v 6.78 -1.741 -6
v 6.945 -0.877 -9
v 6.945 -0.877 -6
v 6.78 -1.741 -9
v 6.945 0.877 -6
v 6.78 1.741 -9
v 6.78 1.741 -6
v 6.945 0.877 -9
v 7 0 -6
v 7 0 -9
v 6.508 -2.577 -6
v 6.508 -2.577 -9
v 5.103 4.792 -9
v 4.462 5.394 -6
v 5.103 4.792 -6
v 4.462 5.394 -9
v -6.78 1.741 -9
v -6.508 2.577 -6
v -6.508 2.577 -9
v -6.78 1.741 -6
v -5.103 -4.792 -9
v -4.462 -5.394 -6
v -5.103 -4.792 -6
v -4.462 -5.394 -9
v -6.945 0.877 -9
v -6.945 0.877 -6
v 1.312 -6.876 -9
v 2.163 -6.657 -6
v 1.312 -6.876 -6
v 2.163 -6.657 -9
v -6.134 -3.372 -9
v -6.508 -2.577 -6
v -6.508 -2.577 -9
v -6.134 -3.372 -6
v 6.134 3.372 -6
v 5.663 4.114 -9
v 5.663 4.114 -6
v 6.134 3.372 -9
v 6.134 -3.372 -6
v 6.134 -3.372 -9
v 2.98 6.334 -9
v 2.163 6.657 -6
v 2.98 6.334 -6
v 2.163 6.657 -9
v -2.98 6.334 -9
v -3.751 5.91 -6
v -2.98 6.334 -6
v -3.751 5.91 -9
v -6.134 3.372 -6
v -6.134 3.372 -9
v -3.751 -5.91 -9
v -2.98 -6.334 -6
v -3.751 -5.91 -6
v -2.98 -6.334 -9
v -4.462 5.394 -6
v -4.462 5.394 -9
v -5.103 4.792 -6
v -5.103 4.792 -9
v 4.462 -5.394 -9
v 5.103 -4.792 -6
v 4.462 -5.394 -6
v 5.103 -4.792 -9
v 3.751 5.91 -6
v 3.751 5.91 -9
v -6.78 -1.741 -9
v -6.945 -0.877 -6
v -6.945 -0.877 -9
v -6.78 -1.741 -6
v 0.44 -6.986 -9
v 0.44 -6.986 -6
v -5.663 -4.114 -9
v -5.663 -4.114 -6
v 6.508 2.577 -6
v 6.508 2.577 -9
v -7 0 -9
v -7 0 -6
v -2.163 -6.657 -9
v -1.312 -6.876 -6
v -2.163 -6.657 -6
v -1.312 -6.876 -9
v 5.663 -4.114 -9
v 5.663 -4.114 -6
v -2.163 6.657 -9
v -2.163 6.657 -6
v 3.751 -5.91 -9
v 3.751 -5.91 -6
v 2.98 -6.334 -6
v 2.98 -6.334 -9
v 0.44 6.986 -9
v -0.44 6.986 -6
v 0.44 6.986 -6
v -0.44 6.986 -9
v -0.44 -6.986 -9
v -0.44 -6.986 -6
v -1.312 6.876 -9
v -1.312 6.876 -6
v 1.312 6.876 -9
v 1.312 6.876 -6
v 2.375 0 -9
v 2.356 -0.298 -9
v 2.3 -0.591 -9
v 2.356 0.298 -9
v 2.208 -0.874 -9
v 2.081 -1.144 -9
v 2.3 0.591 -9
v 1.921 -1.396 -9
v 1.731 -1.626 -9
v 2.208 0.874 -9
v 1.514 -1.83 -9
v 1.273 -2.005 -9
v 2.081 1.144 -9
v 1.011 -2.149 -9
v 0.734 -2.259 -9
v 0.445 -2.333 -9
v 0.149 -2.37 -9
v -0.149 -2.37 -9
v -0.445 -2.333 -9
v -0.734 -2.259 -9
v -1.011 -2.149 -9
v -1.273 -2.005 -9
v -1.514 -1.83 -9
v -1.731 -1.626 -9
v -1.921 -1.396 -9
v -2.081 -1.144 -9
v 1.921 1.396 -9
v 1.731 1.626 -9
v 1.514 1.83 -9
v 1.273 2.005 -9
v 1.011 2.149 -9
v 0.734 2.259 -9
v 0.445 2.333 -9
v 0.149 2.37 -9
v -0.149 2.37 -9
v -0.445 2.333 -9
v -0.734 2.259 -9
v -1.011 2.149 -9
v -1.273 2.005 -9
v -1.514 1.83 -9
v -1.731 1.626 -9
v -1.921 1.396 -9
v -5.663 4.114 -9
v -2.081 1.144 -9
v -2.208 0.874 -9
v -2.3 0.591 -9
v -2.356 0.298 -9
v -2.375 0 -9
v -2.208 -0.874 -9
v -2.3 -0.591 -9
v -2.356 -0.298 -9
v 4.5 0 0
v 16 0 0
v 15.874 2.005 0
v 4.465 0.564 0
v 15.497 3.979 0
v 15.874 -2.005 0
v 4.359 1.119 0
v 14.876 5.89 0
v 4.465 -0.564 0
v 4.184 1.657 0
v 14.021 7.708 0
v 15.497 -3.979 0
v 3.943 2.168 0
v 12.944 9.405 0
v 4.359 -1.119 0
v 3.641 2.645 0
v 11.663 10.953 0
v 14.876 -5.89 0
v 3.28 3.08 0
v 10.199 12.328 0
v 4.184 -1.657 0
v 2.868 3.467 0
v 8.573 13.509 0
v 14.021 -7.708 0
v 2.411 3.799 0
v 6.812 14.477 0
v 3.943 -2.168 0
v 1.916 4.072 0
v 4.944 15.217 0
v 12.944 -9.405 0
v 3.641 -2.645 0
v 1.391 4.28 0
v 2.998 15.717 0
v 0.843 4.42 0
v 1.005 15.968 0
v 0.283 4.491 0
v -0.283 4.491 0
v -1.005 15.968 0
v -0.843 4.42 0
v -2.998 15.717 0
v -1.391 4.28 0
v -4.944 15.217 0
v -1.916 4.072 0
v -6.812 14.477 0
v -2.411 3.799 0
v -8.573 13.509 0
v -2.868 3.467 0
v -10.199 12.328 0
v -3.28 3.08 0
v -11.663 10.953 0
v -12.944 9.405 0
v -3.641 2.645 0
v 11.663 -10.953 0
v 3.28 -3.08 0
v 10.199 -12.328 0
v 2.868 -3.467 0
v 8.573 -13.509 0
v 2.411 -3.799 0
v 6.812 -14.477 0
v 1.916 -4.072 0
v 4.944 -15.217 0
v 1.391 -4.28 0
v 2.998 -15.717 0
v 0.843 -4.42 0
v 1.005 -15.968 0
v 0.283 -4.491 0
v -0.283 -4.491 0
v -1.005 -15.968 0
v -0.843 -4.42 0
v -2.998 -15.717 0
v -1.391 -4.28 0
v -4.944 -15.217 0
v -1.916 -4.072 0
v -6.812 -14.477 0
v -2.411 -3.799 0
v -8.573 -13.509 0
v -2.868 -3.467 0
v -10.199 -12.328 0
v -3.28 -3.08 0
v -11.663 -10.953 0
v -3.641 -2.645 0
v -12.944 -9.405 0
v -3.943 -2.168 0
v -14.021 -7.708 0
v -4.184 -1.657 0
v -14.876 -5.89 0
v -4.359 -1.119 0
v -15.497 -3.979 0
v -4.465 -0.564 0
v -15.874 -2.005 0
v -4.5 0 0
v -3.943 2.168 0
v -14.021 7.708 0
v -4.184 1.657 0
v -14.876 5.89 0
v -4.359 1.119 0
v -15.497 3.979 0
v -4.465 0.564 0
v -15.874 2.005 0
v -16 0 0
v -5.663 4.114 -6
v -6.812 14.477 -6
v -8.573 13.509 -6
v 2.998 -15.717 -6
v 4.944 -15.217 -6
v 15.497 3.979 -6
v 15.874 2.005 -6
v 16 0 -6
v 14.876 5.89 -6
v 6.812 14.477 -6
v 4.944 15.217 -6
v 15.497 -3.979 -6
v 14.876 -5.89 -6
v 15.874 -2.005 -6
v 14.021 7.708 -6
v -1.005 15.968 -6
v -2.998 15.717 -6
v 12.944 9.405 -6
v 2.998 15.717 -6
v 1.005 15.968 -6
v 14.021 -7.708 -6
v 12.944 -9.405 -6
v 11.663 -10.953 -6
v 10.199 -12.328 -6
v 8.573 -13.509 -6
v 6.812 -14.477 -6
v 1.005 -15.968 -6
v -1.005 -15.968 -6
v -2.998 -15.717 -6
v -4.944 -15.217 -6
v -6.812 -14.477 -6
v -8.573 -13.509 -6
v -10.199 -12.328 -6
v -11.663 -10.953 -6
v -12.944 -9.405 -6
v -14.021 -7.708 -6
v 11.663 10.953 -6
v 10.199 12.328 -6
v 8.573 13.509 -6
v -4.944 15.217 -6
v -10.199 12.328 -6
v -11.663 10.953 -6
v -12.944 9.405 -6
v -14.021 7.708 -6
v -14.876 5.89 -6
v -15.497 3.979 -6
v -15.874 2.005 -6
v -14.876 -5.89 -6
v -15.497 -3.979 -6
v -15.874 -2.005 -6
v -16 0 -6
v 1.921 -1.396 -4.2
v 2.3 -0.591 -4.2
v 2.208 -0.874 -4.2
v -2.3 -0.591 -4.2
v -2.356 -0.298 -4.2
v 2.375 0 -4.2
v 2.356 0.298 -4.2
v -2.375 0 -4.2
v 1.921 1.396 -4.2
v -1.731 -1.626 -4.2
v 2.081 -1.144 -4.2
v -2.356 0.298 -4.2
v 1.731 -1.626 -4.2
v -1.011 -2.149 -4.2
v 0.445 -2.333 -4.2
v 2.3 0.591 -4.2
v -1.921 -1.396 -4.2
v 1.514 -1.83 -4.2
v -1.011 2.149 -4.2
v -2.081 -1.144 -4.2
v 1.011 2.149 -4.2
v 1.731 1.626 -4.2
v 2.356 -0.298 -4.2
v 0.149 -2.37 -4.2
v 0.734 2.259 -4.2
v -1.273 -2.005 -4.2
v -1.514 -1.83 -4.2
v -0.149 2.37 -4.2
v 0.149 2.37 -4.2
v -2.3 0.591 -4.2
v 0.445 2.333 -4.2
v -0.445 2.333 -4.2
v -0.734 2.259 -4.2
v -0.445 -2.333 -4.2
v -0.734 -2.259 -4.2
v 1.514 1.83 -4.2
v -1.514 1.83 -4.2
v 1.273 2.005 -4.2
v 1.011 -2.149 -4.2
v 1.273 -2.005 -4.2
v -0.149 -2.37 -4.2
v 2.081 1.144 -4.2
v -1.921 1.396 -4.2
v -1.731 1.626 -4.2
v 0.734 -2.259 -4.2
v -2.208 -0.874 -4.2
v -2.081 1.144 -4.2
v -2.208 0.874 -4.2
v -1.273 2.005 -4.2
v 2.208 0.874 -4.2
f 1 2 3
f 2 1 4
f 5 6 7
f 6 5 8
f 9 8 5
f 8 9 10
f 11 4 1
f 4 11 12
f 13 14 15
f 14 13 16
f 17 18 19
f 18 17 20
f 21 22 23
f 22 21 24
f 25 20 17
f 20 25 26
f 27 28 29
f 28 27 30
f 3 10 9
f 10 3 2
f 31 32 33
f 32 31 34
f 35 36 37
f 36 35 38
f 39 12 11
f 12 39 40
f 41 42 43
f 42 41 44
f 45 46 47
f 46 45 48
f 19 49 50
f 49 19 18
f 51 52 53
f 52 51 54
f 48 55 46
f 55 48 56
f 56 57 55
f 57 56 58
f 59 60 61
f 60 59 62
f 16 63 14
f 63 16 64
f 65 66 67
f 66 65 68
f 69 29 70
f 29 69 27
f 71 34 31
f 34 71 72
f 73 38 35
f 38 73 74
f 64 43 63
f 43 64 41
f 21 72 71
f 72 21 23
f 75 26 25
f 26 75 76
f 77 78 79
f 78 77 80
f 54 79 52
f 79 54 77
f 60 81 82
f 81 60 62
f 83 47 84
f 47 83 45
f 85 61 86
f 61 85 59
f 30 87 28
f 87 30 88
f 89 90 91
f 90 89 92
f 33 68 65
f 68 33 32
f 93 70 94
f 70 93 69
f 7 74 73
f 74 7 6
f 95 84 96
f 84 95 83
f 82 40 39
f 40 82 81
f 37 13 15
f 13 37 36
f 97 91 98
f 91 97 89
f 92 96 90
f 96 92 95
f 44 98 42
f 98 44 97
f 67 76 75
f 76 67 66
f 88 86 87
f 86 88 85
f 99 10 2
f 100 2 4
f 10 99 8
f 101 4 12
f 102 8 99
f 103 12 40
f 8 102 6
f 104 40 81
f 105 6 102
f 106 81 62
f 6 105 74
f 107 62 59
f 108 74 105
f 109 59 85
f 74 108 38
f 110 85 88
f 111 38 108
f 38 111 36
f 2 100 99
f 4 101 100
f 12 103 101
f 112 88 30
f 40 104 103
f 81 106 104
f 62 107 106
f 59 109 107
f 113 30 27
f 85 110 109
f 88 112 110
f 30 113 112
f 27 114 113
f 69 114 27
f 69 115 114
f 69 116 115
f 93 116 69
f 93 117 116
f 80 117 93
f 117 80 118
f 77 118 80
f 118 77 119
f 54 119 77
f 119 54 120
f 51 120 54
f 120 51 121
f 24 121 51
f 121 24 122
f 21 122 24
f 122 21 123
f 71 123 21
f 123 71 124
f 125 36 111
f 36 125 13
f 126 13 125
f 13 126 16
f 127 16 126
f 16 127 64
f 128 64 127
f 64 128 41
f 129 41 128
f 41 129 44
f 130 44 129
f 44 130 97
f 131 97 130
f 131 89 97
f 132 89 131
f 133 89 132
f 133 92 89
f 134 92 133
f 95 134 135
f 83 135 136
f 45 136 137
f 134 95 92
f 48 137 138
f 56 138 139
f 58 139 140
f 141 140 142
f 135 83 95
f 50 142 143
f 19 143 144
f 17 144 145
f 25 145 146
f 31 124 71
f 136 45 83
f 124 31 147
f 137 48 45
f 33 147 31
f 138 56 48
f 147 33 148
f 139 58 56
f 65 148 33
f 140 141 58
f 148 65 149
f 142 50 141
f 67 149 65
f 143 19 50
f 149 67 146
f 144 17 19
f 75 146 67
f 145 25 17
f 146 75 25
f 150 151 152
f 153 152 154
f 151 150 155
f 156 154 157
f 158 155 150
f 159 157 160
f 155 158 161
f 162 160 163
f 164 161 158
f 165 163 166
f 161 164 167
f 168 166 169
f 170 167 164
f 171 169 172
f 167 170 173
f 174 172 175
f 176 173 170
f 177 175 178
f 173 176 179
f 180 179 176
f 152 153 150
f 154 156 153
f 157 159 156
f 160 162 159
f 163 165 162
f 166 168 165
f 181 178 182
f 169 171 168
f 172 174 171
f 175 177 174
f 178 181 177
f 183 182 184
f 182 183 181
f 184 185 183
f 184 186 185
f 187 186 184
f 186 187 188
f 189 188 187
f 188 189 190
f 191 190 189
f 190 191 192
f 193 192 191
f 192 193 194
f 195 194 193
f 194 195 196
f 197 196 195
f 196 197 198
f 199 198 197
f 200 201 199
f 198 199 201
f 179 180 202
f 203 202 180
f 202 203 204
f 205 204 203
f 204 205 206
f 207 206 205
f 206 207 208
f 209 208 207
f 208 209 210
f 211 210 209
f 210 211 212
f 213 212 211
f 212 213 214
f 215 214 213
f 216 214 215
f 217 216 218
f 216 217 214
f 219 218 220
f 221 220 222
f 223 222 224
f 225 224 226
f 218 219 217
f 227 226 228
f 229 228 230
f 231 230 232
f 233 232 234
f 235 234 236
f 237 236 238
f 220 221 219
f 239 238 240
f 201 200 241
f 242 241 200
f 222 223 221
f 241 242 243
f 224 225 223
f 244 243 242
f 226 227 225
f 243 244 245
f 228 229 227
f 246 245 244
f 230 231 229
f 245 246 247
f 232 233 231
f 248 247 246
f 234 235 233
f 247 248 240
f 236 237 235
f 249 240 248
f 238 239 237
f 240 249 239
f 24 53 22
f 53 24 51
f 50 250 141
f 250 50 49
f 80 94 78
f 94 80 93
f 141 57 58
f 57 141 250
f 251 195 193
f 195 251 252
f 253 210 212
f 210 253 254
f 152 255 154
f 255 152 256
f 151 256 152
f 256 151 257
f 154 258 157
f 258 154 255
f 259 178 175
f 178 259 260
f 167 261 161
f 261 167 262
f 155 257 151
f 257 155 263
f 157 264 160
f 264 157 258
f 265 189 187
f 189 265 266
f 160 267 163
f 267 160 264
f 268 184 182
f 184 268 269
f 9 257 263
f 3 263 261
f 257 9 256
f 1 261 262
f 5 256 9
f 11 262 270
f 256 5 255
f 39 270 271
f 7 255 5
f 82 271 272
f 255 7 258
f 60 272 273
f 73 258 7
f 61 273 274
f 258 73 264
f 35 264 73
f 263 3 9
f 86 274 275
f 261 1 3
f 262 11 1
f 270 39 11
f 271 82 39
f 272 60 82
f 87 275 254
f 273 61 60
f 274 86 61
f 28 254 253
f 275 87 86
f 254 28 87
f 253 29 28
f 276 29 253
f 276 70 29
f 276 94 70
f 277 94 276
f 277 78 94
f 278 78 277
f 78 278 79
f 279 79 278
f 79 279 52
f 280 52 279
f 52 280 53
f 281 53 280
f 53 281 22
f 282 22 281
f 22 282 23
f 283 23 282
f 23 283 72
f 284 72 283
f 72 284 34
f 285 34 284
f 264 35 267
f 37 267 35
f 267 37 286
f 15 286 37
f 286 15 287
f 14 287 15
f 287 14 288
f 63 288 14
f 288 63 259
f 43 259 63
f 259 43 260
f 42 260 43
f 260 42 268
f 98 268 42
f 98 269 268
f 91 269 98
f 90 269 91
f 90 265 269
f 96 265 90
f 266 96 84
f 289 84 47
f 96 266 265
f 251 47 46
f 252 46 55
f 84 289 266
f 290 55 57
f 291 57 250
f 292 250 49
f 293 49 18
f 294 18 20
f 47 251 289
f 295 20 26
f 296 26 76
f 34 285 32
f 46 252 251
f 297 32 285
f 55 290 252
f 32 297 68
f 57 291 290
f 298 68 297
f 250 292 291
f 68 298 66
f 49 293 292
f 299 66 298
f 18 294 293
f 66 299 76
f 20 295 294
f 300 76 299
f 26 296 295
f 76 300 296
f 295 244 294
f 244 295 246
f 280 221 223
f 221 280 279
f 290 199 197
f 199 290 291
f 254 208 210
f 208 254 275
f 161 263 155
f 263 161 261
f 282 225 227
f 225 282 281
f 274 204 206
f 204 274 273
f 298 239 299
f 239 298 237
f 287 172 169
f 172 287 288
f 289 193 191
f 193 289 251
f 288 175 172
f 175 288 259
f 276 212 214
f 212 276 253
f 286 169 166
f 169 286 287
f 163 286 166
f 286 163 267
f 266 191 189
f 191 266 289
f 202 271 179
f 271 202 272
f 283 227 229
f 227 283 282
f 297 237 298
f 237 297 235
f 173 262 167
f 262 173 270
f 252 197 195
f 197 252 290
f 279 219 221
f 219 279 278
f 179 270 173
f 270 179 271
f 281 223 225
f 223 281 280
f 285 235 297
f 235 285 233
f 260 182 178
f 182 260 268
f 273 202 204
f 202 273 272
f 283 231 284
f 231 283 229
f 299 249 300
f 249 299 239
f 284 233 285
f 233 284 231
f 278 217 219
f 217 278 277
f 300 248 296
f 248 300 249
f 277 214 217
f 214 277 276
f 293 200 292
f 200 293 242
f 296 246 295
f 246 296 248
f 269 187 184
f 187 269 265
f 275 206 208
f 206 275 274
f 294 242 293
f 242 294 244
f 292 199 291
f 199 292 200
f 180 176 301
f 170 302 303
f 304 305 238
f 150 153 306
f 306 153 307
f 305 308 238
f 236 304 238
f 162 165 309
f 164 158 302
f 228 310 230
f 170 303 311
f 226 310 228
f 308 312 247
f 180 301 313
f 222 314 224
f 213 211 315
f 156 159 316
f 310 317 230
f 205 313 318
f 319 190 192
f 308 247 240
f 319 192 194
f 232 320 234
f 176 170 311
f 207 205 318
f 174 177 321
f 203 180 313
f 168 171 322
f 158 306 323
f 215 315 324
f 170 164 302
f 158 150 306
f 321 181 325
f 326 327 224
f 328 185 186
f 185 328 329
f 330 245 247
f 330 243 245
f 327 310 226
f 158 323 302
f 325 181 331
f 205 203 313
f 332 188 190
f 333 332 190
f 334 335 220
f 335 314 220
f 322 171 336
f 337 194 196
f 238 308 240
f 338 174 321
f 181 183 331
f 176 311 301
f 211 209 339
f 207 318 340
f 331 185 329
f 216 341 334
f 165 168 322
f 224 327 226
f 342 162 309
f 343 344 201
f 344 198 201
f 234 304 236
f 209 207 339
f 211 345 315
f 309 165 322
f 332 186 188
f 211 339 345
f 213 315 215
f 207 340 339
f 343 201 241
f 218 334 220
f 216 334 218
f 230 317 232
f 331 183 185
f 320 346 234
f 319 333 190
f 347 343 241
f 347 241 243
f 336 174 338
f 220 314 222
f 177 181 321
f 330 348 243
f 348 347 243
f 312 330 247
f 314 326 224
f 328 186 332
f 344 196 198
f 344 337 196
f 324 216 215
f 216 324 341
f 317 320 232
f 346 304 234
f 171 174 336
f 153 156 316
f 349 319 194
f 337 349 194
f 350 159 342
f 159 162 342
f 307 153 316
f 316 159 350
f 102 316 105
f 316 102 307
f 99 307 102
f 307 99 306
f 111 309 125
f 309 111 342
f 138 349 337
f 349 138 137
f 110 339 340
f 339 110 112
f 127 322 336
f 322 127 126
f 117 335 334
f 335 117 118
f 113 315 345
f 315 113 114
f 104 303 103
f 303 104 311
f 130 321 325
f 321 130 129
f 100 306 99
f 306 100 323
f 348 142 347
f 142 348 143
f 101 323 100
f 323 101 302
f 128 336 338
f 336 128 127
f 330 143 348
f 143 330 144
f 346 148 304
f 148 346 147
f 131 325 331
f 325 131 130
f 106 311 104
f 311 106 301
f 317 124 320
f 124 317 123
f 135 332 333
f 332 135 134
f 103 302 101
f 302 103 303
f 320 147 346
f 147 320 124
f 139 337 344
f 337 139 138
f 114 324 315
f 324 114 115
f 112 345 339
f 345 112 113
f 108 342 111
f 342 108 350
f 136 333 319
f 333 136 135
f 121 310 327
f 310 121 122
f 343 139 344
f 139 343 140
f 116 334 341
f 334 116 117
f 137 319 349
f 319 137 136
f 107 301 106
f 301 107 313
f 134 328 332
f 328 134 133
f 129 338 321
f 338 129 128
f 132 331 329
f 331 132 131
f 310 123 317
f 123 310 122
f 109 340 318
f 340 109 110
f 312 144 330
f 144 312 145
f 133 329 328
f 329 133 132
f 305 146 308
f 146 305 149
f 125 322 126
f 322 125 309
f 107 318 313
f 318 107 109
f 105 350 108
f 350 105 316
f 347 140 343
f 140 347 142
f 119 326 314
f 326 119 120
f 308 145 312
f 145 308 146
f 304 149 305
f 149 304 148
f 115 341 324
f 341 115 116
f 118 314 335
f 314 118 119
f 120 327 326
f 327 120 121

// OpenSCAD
$fn = 50;


difference() {
	union() {
		translate(v = [0, 0, -9.0000000000]) {
			cylinder(h = 9, r = 7.0000000000);
		}
		translate(v = [0, 0, -6.0000000000]) {
			cylinder(h = 6, r = 16.0000000000);
		}
	}
	union() {
		translate(v = [0, 0, 0]) {
			rotate(a = [0, 0, 0]) {
				difference() {
					union() {
						#translate(v = [0, 0, -9.0000000000]) {
							cylinder(h = 9, r = 2.2500000000);
						}
						#translate(v = [0, 0, -4.2000000000]) {
							cylinder(h = 4.2000000000, r = 7.0000000000, r1 = 2.3750000000, r2 = 4.5000000000);
						}
						#translate(v = [0, 0, -9.0000000000]) {
							cylinder(h = 9, r = 2.3750000000);
						}
						#translate(v = [0, 0, -9.0000000000]) {
							cylinder(h = 9, r = 2.2500000000);
						}
					}
					union();
				}
			}
		}
	}
}
